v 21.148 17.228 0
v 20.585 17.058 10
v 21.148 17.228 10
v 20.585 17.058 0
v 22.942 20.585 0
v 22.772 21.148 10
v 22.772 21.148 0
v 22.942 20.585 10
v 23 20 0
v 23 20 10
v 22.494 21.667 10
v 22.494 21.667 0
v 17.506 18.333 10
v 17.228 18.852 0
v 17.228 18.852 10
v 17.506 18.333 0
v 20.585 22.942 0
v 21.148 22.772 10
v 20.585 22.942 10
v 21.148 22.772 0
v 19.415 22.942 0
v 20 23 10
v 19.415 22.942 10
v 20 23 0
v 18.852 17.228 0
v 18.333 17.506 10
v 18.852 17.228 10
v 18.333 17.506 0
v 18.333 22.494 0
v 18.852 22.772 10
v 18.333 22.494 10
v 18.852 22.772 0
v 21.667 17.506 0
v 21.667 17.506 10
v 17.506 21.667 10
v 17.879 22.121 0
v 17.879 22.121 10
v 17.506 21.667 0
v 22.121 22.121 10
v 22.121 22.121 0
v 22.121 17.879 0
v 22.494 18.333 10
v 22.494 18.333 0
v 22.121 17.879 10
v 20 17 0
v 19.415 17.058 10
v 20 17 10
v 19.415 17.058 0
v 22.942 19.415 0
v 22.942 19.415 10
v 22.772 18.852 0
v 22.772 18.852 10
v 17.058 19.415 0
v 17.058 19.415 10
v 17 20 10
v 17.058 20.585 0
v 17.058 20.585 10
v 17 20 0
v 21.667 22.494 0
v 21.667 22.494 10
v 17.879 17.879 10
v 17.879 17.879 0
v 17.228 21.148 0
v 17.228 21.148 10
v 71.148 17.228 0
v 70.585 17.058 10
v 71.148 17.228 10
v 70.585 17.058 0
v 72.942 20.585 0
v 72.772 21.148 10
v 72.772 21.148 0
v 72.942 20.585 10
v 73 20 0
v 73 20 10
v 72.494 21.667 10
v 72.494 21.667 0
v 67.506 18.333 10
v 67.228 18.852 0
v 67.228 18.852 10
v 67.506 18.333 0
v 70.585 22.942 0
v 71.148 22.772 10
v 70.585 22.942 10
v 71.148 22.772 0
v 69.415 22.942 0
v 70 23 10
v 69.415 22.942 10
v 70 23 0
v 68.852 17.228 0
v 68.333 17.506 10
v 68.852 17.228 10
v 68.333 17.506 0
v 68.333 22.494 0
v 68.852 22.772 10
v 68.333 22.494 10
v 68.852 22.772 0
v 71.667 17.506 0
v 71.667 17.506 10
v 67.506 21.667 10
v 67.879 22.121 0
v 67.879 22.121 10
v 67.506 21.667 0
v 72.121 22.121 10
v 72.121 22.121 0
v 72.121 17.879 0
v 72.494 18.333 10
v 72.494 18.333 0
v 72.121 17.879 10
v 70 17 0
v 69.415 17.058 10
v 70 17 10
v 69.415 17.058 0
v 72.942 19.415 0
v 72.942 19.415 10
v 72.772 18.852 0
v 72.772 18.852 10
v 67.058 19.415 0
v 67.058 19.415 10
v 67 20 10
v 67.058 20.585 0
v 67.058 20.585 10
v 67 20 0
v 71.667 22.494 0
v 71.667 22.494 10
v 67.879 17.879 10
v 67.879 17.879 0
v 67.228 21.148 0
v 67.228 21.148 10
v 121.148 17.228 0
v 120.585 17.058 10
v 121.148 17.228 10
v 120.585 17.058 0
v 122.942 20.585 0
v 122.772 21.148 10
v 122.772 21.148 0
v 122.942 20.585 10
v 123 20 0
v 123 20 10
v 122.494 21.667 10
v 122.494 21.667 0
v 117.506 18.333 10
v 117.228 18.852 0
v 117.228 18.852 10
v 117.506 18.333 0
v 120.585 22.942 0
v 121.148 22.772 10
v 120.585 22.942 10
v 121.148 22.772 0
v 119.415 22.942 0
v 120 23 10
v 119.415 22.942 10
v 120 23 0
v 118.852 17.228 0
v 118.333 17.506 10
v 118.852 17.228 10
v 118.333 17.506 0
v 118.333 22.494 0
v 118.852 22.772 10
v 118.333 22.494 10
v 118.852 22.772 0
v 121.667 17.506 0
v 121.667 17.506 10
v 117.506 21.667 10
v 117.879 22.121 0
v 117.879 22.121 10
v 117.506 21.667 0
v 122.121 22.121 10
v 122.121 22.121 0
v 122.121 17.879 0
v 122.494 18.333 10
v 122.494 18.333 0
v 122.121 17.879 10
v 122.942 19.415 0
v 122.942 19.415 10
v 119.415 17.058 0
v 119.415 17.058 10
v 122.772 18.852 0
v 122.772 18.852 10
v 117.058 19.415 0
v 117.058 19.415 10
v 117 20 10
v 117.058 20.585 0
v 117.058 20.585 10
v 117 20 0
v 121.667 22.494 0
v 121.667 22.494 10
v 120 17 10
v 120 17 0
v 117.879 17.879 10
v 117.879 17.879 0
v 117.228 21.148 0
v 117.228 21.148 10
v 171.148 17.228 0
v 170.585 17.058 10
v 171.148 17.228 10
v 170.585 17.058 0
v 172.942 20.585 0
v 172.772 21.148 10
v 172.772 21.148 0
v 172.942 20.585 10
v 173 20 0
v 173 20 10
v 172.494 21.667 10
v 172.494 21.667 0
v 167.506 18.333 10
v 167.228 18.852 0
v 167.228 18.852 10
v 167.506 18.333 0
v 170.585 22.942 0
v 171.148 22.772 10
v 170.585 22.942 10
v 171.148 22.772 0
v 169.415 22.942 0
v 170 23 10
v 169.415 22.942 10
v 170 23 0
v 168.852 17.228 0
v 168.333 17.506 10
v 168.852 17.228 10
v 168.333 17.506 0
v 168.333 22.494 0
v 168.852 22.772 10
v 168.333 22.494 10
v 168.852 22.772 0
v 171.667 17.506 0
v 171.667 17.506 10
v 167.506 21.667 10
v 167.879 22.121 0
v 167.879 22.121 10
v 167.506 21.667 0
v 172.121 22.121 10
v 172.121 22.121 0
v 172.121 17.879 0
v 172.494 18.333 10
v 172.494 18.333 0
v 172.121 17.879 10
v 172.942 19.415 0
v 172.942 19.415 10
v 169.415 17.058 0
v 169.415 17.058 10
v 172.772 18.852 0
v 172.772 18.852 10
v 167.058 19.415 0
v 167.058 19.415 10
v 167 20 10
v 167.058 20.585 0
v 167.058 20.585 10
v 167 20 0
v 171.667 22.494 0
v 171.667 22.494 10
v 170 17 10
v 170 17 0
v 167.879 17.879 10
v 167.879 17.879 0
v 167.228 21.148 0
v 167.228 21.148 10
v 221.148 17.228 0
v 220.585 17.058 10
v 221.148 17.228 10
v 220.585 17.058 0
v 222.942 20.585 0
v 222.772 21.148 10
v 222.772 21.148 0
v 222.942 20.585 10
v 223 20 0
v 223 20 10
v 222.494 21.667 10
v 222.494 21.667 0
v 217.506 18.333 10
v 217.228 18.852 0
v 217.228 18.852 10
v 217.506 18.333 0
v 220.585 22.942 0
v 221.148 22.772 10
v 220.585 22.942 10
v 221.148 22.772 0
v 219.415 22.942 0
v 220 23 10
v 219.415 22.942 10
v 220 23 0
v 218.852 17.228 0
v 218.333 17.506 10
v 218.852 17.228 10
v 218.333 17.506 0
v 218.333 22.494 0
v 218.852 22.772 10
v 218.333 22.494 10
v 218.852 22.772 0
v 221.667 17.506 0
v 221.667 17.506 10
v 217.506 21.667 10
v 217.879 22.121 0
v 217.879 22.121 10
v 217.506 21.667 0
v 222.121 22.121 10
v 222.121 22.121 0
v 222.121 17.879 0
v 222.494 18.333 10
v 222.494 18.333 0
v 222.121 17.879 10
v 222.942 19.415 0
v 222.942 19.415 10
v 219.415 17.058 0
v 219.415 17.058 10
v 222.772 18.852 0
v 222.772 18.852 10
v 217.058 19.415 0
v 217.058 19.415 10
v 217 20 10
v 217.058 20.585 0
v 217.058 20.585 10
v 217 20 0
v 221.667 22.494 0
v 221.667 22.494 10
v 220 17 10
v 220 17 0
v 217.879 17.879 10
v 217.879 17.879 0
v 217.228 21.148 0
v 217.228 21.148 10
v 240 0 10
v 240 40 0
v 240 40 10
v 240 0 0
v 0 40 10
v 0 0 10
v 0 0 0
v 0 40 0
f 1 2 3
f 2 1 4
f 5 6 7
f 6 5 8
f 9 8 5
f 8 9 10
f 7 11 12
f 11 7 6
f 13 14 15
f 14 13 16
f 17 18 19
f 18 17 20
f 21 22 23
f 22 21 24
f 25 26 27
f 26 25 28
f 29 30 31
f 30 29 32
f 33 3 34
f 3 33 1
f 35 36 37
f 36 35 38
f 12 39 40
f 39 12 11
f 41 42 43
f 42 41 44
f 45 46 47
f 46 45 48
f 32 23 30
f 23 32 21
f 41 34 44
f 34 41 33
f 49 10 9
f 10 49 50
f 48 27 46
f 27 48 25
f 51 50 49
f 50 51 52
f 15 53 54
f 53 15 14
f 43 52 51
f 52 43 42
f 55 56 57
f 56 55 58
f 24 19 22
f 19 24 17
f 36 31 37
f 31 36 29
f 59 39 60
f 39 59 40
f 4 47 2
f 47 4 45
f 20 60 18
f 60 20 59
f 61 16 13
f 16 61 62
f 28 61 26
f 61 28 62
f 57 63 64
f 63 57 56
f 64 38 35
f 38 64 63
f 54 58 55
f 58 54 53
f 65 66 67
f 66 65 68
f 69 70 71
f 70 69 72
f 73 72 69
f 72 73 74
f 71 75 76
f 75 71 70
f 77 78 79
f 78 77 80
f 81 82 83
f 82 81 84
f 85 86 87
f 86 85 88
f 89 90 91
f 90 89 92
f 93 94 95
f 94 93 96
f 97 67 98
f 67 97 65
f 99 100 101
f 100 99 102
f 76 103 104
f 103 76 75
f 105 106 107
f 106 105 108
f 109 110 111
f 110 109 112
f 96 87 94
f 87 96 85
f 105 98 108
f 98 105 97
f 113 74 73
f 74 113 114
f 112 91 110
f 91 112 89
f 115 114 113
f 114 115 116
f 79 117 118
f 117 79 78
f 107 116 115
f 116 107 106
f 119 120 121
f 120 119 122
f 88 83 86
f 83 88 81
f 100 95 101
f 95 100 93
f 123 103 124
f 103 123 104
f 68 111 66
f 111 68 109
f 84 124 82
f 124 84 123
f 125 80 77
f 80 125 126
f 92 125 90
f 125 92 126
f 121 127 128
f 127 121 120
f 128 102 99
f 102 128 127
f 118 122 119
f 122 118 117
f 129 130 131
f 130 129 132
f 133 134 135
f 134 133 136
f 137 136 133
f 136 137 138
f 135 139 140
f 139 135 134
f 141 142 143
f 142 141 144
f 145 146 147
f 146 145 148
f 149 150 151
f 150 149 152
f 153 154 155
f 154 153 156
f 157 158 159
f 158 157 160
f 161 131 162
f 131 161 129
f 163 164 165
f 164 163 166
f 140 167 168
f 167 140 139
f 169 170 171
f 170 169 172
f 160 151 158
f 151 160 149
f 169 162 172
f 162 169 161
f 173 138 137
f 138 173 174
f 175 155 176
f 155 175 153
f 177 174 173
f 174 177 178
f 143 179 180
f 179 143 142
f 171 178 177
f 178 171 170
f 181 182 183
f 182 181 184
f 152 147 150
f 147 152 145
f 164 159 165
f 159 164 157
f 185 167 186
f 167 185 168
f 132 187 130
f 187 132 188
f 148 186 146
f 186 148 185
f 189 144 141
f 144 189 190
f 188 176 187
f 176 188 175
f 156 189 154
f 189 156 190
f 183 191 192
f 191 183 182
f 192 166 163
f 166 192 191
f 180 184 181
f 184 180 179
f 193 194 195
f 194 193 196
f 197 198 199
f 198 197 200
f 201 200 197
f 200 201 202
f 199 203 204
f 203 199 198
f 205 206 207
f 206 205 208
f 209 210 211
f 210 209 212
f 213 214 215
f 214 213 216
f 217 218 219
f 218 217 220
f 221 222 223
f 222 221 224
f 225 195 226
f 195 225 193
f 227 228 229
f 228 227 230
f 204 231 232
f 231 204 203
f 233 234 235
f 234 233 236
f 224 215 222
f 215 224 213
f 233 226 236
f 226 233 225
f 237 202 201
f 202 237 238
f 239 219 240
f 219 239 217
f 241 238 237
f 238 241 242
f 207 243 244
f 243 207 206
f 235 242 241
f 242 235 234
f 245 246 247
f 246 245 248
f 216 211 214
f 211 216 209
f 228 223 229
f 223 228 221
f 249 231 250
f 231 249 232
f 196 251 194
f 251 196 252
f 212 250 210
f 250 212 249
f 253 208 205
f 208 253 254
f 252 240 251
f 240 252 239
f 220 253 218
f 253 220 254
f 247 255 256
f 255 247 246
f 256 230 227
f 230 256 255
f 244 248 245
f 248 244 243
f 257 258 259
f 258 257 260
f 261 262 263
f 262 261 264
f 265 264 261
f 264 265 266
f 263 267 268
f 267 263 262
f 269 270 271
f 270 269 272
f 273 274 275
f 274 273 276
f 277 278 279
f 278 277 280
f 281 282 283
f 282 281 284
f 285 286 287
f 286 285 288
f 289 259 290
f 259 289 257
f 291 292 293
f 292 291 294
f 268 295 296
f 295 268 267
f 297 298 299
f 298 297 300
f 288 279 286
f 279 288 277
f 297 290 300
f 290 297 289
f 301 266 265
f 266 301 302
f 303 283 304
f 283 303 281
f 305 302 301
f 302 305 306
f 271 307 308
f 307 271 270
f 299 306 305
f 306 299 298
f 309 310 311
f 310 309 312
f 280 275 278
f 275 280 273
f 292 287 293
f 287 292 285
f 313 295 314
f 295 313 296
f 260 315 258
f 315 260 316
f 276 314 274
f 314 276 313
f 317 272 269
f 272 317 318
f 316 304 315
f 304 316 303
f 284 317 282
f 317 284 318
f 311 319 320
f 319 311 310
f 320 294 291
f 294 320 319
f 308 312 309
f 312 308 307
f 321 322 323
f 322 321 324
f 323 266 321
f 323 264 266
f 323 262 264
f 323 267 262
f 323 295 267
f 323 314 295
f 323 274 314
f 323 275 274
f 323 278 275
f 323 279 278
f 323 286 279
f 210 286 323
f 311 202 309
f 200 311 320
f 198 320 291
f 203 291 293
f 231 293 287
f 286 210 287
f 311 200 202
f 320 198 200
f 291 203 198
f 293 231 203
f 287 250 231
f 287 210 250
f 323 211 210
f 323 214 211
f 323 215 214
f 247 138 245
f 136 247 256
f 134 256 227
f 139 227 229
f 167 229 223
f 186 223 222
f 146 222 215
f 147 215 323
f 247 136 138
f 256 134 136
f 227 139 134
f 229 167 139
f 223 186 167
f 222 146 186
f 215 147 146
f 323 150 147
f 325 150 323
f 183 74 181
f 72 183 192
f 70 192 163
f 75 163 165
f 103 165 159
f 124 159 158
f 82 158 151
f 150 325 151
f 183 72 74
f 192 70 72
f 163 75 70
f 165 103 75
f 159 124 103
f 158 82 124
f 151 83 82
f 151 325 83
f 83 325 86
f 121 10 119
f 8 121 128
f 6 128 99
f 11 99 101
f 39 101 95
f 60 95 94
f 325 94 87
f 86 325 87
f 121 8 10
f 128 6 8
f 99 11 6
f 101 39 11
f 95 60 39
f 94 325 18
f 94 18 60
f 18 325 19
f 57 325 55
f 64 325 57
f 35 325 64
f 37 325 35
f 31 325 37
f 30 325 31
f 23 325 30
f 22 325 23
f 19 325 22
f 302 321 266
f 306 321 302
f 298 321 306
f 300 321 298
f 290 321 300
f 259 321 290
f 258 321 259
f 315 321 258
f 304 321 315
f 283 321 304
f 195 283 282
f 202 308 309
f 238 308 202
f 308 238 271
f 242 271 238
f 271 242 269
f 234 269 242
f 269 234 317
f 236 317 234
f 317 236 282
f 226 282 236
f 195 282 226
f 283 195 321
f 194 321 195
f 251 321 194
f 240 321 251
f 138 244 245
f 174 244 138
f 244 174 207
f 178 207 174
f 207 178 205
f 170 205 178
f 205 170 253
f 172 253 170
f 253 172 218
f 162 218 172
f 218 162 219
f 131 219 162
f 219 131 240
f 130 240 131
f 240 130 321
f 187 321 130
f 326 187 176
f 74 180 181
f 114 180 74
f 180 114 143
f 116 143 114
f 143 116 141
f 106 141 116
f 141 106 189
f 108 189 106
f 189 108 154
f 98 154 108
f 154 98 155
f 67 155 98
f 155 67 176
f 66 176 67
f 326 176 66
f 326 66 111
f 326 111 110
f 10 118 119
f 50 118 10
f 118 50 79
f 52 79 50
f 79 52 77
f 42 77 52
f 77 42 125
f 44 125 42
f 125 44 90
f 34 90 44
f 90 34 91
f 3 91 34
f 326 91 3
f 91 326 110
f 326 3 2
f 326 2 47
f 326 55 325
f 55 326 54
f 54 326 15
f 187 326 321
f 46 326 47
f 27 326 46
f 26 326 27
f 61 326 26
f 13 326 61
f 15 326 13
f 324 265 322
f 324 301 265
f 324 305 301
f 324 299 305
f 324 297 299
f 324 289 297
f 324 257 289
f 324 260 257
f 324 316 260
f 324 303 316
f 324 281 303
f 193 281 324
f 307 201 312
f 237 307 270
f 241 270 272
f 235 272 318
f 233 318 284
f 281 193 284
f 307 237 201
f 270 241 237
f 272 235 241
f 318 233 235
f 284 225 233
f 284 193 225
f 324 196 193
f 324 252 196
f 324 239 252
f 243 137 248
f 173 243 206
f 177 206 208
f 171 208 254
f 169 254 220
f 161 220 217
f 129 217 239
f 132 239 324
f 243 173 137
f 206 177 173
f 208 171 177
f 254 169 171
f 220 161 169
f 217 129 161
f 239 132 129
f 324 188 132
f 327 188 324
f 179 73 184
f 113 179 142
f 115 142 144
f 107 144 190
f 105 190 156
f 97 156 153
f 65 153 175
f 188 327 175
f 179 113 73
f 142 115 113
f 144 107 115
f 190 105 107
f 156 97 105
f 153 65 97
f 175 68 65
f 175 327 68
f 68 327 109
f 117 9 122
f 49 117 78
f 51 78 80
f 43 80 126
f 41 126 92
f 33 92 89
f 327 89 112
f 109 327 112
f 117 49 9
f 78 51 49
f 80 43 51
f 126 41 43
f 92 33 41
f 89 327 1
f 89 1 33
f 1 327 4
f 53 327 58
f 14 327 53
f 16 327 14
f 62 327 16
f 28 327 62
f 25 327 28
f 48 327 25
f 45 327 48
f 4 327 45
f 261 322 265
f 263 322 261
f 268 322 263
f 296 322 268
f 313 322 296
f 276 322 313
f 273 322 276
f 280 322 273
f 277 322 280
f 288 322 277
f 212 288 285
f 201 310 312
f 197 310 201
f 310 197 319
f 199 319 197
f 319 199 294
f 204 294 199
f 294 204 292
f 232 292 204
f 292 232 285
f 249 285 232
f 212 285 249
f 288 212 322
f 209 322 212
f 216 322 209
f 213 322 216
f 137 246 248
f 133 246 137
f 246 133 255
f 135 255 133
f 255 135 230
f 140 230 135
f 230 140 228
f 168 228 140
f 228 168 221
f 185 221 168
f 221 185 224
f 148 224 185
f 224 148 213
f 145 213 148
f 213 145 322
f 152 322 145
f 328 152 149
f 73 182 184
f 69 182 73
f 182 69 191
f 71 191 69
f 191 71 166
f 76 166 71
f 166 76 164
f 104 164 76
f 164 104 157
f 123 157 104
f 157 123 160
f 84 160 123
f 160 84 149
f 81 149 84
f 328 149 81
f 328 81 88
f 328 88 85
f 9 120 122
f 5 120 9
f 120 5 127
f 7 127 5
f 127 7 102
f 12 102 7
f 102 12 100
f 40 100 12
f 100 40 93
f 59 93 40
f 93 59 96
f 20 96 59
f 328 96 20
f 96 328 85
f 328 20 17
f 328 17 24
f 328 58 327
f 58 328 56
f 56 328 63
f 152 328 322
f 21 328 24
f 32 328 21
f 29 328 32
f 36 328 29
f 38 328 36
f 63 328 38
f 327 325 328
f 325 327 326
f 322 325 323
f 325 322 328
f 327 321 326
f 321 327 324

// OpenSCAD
$fn = 32;

// ----------------------------------------------------------------------
// Long rail: 200-250 mm mounting rail
// ----------------------------------------------------------------------

// --- parameters (mm) ---
rail_l = 240;             // rail length, X
rail_w = 40;              // rail width, Y
rail_t = 10;              // rail thickness, Z
hole_d = 6;               // mounting hole diameter
hole_start = 20;          // first hole offset from the end
hole_pitch = 50;          // hole pitch
holes = 5;                // number of holes

difference() {
  cube([rail_l, rail_w, rail_t]);
  for (i = [0 : holes - 1])
    translate([hole_start + i * hole_pitch, rail_w / 2, -1])
      cylinder(h = rail_t + 2, d = hole_d);
}
